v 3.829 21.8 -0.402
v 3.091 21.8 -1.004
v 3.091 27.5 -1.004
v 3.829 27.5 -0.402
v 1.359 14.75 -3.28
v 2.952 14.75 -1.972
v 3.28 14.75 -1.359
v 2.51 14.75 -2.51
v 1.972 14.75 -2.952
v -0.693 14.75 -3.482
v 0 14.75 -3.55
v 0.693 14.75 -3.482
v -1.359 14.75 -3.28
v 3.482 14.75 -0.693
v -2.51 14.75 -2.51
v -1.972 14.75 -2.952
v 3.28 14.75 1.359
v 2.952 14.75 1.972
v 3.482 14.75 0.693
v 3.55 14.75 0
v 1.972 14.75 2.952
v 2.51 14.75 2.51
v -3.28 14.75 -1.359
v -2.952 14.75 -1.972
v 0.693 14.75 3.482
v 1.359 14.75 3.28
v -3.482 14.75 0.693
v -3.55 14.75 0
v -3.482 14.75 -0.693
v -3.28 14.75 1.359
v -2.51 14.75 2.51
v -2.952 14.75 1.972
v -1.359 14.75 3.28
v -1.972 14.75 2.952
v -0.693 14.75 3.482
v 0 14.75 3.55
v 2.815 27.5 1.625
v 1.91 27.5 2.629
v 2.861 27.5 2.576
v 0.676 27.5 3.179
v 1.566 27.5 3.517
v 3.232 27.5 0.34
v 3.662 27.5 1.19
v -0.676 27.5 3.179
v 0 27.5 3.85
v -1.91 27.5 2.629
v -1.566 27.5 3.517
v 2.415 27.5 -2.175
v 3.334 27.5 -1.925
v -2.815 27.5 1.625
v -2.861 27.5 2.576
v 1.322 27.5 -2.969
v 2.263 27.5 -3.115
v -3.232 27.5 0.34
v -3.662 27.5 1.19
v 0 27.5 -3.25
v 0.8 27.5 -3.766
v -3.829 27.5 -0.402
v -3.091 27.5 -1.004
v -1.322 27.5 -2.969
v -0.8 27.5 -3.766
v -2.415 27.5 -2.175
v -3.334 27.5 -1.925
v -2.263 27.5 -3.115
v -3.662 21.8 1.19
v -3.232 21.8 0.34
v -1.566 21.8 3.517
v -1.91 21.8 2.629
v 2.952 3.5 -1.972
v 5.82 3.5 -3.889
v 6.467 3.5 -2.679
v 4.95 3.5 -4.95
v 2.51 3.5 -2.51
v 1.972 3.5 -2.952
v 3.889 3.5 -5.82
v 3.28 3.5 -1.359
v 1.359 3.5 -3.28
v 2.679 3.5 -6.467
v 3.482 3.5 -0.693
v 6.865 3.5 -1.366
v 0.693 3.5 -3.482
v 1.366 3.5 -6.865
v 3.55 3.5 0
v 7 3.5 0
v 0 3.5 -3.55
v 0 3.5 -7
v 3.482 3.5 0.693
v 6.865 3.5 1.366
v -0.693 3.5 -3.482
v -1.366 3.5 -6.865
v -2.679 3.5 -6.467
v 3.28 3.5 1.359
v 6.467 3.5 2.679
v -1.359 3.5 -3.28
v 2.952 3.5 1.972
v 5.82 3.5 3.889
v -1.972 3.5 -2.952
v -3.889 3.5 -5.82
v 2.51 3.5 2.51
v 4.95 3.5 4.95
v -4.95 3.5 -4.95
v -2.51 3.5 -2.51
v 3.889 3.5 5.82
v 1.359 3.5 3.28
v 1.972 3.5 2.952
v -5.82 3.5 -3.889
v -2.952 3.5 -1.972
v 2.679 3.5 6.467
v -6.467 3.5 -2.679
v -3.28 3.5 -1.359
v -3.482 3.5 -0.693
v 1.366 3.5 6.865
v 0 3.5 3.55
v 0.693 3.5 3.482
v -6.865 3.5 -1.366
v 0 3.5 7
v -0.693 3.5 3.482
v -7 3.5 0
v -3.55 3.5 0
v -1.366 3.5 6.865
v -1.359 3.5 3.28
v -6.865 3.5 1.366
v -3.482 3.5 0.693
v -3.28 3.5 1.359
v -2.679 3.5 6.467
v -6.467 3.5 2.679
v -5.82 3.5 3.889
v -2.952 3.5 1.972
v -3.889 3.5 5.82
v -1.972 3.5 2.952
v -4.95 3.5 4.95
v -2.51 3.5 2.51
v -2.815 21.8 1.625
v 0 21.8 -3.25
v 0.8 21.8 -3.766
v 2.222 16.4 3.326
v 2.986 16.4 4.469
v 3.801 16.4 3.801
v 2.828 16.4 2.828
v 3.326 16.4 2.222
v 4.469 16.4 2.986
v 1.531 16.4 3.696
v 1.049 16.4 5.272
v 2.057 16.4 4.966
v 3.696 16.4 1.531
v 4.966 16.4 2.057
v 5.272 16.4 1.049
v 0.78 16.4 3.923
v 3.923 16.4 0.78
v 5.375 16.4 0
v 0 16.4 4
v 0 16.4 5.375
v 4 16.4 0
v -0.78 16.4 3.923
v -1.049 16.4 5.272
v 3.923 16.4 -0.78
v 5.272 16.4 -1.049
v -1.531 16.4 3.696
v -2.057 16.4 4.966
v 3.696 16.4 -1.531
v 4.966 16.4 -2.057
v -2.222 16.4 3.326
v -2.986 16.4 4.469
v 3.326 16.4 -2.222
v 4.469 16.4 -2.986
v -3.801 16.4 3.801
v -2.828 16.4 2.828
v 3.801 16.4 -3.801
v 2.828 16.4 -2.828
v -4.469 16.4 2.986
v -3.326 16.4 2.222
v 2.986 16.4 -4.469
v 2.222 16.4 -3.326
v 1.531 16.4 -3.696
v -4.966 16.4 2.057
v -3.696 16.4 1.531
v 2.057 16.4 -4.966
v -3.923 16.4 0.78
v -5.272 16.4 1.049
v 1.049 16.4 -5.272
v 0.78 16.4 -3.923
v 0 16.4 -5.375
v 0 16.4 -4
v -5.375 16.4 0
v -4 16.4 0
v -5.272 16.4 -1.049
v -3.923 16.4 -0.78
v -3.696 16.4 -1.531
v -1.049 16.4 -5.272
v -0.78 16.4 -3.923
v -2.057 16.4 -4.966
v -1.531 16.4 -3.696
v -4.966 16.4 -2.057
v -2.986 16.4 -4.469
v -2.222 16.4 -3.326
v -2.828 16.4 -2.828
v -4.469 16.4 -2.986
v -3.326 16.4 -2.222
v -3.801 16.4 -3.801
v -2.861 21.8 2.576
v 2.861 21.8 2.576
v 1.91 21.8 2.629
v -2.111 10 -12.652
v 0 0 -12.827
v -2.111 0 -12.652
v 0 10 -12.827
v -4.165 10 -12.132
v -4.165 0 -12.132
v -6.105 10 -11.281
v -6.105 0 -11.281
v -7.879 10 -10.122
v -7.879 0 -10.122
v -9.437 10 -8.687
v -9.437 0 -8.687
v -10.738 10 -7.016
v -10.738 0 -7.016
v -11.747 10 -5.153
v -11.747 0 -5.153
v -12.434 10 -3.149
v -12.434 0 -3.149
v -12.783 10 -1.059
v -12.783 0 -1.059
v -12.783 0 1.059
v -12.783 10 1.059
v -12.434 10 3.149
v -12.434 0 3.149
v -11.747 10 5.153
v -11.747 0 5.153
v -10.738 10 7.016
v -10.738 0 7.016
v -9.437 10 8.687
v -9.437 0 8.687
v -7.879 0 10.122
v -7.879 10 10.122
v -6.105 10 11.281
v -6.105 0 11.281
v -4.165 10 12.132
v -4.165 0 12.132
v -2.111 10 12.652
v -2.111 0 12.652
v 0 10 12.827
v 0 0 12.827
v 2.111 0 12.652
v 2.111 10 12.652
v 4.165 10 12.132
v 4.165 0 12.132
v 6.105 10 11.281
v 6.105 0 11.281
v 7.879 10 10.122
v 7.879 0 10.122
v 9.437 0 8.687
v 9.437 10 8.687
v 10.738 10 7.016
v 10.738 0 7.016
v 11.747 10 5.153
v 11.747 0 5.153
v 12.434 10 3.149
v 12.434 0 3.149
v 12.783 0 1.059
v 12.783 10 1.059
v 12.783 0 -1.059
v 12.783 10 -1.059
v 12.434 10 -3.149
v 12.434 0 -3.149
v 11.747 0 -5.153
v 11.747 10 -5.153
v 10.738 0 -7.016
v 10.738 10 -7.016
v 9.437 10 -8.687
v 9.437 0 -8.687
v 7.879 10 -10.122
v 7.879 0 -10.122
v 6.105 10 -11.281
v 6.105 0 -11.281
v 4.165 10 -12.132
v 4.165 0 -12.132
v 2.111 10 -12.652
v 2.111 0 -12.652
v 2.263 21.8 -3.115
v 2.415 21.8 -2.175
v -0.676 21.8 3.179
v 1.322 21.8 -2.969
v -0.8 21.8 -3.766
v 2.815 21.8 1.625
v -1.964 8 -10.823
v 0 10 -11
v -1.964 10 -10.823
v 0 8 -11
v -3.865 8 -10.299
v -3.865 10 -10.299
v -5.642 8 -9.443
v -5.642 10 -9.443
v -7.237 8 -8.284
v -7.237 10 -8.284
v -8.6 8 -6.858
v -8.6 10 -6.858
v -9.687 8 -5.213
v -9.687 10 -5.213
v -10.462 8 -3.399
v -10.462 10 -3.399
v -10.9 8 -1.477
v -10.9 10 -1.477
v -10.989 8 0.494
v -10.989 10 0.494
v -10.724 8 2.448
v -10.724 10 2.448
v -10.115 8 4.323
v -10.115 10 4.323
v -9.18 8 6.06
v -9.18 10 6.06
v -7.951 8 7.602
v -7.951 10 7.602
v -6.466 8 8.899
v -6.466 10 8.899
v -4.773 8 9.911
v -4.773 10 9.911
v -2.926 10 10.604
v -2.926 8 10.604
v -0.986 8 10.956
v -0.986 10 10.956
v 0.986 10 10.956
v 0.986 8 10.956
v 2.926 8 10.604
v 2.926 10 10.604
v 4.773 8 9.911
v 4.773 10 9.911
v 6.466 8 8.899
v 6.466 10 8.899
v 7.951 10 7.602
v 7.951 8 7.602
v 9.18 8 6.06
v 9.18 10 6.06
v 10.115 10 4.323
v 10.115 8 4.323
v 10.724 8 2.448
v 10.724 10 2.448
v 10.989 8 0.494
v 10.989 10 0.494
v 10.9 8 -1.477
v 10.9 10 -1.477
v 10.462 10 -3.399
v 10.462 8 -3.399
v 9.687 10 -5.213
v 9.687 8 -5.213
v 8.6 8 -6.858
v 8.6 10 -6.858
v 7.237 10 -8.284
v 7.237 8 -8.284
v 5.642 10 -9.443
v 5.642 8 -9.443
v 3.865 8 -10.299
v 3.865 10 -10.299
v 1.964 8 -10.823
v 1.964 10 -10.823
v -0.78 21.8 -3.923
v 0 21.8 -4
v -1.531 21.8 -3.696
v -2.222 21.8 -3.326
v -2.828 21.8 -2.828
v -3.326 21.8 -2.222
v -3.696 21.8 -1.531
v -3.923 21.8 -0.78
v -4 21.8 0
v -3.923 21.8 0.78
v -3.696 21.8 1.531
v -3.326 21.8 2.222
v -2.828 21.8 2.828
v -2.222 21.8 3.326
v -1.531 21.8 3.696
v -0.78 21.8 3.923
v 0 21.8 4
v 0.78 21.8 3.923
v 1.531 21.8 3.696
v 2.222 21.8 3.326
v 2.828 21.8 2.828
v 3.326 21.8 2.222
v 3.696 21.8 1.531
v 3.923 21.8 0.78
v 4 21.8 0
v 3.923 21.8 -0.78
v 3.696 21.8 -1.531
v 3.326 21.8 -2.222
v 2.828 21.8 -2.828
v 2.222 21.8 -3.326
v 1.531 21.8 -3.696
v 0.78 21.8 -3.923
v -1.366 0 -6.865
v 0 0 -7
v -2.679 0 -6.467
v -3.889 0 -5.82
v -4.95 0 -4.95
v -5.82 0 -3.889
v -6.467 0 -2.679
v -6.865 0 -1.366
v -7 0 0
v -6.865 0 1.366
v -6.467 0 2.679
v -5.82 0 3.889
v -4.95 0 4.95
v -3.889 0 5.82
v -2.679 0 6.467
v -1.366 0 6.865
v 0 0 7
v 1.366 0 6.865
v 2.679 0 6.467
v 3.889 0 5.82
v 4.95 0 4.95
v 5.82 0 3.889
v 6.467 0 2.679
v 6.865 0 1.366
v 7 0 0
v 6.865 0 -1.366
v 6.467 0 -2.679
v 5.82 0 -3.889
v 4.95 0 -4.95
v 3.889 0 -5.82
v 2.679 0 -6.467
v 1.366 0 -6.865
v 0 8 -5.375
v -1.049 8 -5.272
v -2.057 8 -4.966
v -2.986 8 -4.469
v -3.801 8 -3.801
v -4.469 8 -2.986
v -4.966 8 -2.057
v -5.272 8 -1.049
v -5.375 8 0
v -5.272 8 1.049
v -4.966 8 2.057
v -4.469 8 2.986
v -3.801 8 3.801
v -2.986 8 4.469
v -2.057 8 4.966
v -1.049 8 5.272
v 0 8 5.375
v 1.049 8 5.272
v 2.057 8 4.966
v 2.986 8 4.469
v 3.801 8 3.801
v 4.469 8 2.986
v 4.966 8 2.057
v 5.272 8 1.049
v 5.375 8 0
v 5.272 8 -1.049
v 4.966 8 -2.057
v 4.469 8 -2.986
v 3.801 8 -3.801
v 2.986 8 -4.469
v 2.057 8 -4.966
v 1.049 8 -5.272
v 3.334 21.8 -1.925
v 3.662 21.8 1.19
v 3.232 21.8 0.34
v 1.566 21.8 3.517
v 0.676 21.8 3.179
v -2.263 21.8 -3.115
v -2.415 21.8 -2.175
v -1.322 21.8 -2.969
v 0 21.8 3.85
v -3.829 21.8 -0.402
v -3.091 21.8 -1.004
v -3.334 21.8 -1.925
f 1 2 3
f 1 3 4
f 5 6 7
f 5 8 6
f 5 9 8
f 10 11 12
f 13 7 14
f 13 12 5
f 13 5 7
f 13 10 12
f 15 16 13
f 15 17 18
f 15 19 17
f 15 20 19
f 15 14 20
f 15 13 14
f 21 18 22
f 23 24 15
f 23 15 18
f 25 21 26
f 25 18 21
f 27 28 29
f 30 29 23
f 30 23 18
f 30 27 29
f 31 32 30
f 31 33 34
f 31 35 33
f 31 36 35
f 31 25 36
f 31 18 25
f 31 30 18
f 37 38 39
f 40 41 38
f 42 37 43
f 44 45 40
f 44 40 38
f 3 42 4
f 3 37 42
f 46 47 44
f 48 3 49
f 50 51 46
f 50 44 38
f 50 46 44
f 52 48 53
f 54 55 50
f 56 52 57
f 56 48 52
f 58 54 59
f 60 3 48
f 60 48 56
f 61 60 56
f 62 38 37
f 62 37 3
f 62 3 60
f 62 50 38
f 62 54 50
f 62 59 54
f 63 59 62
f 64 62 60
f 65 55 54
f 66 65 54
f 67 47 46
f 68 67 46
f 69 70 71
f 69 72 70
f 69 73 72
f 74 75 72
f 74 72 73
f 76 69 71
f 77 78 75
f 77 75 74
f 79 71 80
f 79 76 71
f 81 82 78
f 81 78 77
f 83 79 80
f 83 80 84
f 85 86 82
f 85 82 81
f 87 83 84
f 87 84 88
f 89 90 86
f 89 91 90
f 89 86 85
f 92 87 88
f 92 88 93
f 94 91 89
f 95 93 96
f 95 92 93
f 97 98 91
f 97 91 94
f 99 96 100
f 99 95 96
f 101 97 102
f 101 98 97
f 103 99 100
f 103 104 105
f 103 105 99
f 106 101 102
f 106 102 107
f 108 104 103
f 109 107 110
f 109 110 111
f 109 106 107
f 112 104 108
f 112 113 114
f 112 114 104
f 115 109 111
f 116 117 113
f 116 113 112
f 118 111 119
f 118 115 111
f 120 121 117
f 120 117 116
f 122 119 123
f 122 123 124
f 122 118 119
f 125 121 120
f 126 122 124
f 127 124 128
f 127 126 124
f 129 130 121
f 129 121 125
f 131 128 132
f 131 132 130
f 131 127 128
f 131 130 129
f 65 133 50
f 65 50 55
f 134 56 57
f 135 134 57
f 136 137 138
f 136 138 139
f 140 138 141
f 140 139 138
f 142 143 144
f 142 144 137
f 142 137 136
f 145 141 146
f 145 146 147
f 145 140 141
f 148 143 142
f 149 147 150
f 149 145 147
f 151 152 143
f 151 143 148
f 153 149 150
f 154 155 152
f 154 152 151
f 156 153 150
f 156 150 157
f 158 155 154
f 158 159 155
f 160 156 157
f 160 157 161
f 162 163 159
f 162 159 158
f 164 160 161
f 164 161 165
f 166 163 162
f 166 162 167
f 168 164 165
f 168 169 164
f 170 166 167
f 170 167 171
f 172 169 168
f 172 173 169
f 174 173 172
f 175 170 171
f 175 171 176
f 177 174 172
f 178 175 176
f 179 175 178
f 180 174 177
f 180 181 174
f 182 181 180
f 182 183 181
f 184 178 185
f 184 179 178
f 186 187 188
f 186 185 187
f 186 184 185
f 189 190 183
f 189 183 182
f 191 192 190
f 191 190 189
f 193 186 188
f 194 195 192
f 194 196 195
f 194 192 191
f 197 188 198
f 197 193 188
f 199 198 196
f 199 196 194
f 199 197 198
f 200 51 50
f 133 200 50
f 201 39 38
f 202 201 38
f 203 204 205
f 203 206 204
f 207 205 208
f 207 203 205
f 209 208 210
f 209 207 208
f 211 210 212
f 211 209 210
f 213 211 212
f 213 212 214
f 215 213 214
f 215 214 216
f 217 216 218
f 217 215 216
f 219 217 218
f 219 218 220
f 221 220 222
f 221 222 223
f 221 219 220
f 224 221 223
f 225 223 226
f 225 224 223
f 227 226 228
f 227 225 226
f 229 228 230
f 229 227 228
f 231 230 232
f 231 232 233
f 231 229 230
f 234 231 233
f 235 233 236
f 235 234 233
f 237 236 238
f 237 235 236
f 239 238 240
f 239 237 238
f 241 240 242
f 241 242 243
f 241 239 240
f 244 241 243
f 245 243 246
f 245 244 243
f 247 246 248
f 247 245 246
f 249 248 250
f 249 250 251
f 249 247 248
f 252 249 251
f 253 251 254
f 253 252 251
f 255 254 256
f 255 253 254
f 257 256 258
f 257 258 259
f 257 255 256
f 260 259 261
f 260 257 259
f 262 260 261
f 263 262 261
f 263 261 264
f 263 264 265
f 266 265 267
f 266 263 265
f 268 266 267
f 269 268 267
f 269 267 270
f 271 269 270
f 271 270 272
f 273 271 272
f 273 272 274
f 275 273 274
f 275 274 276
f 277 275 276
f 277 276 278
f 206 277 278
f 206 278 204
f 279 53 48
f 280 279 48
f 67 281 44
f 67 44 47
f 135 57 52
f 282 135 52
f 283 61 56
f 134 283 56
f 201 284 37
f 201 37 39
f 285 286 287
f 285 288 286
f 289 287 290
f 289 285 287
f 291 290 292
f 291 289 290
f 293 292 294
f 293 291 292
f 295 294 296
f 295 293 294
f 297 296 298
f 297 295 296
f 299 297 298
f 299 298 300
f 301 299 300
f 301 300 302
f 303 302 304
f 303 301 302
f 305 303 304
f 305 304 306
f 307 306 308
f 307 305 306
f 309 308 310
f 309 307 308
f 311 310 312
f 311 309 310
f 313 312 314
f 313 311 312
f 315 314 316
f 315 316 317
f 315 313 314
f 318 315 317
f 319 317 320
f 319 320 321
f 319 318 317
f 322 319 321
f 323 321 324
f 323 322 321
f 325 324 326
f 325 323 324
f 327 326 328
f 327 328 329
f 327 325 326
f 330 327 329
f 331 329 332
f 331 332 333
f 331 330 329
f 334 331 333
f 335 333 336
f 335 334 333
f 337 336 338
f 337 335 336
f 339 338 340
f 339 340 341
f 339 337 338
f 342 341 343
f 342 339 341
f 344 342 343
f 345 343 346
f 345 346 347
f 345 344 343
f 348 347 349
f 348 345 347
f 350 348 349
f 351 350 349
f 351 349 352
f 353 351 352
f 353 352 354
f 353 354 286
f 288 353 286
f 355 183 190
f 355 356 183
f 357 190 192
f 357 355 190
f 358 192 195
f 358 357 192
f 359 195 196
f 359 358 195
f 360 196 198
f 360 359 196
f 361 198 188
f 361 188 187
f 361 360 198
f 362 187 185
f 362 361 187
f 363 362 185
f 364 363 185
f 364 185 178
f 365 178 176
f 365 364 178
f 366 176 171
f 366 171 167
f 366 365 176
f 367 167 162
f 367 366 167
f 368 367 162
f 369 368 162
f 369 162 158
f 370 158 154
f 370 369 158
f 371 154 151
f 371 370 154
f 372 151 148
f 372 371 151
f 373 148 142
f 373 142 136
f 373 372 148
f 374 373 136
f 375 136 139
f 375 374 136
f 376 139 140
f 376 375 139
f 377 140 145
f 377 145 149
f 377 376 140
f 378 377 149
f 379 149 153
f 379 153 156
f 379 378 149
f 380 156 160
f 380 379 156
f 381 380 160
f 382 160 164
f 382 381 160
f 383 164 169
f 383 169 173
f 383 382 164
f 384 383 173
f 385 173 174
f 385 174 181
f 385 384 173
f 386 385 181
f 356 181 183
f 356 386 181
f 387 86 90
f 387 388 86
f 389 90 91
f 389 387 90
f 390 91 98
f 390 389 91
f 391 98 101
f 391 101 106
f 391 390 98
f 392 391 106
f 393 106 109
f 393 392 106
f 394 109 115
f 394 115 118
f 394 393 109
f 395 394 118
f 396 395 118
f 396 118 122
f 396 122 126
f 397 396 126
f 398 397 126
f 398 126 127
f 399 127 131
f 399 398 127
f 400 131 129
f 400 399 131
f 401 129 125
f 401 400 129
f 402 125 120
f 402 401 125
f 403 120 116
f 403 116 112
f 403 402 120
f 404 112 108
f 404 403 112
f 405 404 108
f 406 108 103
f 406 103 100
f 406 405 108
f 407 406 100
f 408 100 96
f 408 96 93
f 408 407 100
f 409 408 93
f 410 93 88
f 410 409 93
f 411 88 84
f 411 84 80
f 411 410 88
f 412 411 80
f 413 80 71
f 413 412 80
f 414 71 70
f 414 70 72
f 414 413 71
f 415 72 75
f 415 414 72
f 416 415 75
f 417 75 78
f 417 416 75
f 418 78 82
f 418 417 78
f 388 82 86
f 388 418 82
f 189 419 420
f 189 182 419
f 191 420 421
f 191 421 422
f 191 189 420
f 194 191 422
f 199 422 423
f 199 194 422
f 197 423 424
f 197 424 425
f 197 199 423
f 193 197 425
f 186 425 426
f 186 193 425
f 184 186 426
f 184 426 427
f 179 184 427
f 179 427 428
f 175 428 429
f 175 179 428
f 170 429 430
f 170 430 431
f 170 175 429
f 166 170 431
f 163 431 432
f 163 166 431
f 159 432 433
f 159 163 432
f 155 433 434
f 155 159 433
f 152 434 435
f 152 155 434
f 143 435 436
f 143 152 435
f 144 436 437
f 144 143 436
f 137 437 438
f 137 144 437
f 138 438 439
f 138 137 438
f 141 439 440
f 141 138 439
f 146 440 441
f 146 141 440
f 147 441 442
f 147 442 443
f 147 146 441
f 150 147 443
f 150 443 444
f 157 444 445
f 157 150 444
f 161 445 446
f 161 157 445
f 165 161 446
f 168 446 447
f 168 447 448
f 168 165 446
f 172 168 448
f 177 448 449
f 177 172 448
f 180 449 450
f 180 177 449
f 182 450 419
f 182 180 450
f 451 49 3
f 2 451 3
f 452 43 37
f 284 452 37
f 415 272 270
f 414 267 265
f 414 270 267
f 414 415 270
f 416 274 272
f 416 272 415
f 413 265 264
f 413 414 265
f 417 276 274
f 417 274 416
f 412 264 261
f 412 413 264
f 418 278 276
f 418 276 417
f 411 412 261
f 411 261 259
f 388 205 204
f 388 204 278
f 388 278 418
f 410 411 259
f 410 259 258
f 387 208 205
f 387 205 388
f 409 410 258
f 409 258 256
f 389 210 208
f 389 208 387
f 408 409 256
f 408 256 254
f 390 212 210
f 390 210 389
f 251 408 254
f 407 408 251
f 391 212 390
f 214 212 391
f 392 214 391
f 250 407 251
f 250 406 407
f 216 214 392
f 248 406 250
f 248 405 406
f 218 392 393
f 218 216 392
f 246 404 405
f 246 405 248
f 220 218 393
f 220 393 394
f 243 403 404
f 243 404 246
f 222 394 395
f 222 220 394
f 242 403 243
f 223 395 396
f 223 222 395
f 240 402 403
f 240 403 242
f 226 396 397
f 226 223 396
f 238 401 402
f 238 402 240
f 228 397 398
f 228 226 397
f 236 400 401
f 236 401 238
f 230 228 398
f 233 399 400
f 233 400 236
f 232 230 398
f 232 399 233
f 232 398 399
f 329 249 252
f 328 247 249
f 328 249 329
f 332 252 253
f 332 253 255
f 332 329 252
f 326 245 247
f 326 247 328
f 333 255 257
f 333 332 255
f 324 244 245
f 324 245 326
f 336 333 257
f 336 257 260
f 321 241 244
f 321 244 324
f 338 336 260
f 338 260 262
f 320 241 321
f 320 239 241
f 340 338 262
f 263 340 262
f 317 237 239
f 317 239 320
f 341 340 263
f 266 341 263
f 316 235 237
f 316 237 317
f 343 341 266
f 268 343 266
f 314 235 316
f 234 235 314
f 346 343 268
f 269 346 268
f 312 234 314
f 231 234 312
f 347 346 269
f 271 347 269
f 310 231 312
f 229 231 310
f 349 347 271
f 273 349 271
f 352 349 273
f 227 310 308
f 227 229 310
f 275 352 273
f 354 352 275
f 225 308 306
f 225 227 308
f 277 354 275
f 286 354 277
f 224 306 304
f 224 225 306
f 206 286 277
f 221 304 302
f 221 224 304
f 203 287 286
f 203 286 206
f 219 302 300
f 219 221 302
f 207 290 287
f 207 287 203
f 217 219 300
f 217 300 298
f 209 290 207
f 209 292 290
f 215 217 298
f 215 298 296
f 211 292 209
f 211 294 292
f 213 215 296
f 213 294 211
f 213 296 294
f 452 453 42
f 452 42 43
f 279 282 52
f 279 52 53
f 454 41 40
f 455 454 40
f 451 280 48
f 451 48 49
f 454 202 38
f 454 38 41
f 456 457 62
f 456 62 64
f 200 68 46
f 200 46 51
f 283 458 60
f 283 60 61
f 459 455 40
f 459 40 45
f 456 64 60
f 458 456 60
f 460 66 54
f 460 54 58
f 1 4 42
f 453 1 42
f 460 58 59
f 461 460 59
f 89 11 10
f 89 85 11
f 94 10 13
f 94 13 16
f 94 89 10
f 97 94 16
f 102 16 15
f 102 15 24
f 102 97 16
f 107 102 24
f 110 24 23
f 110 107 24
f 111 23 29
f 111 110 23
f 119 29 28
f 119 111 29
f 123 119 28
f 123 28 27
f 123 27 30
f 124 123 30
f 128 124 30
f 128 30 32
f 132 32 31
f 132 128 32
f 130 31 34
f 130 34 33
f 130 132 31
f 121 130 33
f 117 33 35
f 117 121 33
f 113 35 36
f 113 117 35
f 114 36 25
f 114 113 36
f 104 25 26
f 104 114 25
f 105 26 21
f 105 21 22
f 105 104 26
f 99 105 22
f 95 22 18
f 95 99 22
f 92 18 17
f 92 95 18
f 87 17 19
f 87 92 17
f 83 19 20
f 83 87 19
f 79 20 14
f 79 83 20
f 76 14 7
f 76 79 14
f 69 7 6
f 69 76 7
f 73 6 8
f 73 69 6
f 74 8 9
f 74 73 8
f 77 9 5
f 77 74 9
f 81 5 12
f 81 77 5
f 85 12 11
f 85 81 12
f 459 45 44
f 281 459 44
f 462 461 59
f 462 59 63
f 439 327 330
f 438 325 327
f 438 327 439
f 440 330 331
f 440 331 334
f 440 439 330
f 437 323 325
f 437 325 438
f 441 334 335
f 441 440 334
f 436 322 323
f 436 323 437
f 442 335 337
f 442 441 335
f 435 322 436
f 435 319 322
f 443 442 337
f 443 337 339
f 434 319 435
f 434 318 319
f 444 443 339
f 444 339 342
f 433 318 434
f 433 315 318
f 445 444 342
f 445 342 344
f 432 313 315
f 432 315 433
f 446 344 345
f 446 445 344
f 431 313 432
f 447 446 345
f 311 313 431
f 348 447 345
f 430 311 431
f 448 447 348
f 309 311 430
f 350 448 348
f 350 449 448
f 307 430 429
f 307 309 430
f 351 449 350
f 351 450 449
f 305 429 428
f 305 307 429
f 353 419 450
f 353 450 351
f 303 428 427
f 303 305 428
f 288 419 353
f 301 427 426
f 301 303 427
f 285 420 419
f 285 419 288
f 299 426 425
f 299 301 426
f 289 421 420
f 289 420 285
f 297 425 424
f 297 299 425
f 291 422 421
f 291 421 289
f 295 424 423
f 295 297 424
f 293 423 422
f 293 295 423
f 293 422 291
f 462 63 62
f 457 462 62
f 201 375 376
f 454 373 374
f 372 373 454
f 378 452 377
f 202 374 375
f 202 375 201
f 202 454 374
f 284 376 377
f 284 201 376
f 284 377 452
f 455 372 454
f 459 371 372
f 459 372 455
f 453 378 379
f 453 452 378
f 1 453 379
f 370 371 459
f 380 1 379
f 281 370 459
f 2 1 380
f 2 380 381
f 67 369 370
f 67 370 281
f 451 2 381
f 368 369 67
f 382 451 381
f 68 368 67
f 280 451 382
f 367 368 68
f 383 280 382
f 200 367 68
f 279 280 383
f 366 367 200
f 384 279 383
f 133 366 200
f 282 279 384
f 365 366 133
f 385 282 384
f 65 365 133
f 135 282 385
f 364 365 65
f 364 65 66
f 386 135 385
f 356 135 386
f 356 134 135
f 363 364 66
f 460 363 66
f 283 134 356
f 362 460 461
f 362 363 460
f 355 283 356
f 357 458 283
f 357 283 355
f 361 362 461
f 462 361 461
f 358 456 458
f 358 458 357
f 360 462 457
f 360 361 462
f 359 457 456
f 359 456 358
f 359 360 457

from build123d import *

# Parameters (mm, degrees)
CUT_EXTRUDE1_DEPTH = 5.7
CIRPATTERN1_COUNT  = 15


with BuildPart() as part:
    # Sketch1 → 52 Tooth (revolve)
    with BuildSketch(Plane.XY, mode=Mode.PRIVATE) as f_52_tooth_sk:
        Polygon((12.827, 0), (12.827, 10), (11, 10), (11, 8), (5.375, 8), (5.375, 16.4), (4, 16.4), (4, 21.8), (3.85, 21.8), (3.85, 27.5), (0, 27.5), (0, 14.75), (3.55, 14.75), (3.55, 3.5), (7, 3.5), (7, 0), align=None)
    revolve(f_52_tooth_sk.sketch.rotate(Axis((0, 0, 0), (0, 1, 0)), 90), axis=Axis((0, 0, 0), (0, 1, 0)))

    # Sketch2 → Cut-Extrude1 (cut)
    with BuildSketch(Plane(origin=(0, 27.5, 0), x_dir=(1, 0, 0), z_dir=(0, 1, 0))):
        with BuildLine():
            ThreePointArc((0.80046001, 3.765868263), (0, 3.85), (-0.80046001, 3.765868263))
            Line((-0.80046001, 3.765868263), (0, 3.25))
            Line((0, 3.25), (0.80046001, 3.765868263))
        make_face()
    cut_extrude1 = extrude(amount=-CUT_EXTRUDE1_DEPTH, mode=Mode.SUBTRACT)

    # CirPattern1: Cut-Extrude1 ×15 about axis
    cirpattern1_axis = Axis((0, 0, 0), (0, 1, 0))
    for i in range(1, CIRPATTERN1_COUNT):
        add(cut_extrude1.rotate(cirpattern1_axis, i * 360 / CIRPATTERN1_COUNT), mode=Mode.SUBTRACT)


solid = part.part
